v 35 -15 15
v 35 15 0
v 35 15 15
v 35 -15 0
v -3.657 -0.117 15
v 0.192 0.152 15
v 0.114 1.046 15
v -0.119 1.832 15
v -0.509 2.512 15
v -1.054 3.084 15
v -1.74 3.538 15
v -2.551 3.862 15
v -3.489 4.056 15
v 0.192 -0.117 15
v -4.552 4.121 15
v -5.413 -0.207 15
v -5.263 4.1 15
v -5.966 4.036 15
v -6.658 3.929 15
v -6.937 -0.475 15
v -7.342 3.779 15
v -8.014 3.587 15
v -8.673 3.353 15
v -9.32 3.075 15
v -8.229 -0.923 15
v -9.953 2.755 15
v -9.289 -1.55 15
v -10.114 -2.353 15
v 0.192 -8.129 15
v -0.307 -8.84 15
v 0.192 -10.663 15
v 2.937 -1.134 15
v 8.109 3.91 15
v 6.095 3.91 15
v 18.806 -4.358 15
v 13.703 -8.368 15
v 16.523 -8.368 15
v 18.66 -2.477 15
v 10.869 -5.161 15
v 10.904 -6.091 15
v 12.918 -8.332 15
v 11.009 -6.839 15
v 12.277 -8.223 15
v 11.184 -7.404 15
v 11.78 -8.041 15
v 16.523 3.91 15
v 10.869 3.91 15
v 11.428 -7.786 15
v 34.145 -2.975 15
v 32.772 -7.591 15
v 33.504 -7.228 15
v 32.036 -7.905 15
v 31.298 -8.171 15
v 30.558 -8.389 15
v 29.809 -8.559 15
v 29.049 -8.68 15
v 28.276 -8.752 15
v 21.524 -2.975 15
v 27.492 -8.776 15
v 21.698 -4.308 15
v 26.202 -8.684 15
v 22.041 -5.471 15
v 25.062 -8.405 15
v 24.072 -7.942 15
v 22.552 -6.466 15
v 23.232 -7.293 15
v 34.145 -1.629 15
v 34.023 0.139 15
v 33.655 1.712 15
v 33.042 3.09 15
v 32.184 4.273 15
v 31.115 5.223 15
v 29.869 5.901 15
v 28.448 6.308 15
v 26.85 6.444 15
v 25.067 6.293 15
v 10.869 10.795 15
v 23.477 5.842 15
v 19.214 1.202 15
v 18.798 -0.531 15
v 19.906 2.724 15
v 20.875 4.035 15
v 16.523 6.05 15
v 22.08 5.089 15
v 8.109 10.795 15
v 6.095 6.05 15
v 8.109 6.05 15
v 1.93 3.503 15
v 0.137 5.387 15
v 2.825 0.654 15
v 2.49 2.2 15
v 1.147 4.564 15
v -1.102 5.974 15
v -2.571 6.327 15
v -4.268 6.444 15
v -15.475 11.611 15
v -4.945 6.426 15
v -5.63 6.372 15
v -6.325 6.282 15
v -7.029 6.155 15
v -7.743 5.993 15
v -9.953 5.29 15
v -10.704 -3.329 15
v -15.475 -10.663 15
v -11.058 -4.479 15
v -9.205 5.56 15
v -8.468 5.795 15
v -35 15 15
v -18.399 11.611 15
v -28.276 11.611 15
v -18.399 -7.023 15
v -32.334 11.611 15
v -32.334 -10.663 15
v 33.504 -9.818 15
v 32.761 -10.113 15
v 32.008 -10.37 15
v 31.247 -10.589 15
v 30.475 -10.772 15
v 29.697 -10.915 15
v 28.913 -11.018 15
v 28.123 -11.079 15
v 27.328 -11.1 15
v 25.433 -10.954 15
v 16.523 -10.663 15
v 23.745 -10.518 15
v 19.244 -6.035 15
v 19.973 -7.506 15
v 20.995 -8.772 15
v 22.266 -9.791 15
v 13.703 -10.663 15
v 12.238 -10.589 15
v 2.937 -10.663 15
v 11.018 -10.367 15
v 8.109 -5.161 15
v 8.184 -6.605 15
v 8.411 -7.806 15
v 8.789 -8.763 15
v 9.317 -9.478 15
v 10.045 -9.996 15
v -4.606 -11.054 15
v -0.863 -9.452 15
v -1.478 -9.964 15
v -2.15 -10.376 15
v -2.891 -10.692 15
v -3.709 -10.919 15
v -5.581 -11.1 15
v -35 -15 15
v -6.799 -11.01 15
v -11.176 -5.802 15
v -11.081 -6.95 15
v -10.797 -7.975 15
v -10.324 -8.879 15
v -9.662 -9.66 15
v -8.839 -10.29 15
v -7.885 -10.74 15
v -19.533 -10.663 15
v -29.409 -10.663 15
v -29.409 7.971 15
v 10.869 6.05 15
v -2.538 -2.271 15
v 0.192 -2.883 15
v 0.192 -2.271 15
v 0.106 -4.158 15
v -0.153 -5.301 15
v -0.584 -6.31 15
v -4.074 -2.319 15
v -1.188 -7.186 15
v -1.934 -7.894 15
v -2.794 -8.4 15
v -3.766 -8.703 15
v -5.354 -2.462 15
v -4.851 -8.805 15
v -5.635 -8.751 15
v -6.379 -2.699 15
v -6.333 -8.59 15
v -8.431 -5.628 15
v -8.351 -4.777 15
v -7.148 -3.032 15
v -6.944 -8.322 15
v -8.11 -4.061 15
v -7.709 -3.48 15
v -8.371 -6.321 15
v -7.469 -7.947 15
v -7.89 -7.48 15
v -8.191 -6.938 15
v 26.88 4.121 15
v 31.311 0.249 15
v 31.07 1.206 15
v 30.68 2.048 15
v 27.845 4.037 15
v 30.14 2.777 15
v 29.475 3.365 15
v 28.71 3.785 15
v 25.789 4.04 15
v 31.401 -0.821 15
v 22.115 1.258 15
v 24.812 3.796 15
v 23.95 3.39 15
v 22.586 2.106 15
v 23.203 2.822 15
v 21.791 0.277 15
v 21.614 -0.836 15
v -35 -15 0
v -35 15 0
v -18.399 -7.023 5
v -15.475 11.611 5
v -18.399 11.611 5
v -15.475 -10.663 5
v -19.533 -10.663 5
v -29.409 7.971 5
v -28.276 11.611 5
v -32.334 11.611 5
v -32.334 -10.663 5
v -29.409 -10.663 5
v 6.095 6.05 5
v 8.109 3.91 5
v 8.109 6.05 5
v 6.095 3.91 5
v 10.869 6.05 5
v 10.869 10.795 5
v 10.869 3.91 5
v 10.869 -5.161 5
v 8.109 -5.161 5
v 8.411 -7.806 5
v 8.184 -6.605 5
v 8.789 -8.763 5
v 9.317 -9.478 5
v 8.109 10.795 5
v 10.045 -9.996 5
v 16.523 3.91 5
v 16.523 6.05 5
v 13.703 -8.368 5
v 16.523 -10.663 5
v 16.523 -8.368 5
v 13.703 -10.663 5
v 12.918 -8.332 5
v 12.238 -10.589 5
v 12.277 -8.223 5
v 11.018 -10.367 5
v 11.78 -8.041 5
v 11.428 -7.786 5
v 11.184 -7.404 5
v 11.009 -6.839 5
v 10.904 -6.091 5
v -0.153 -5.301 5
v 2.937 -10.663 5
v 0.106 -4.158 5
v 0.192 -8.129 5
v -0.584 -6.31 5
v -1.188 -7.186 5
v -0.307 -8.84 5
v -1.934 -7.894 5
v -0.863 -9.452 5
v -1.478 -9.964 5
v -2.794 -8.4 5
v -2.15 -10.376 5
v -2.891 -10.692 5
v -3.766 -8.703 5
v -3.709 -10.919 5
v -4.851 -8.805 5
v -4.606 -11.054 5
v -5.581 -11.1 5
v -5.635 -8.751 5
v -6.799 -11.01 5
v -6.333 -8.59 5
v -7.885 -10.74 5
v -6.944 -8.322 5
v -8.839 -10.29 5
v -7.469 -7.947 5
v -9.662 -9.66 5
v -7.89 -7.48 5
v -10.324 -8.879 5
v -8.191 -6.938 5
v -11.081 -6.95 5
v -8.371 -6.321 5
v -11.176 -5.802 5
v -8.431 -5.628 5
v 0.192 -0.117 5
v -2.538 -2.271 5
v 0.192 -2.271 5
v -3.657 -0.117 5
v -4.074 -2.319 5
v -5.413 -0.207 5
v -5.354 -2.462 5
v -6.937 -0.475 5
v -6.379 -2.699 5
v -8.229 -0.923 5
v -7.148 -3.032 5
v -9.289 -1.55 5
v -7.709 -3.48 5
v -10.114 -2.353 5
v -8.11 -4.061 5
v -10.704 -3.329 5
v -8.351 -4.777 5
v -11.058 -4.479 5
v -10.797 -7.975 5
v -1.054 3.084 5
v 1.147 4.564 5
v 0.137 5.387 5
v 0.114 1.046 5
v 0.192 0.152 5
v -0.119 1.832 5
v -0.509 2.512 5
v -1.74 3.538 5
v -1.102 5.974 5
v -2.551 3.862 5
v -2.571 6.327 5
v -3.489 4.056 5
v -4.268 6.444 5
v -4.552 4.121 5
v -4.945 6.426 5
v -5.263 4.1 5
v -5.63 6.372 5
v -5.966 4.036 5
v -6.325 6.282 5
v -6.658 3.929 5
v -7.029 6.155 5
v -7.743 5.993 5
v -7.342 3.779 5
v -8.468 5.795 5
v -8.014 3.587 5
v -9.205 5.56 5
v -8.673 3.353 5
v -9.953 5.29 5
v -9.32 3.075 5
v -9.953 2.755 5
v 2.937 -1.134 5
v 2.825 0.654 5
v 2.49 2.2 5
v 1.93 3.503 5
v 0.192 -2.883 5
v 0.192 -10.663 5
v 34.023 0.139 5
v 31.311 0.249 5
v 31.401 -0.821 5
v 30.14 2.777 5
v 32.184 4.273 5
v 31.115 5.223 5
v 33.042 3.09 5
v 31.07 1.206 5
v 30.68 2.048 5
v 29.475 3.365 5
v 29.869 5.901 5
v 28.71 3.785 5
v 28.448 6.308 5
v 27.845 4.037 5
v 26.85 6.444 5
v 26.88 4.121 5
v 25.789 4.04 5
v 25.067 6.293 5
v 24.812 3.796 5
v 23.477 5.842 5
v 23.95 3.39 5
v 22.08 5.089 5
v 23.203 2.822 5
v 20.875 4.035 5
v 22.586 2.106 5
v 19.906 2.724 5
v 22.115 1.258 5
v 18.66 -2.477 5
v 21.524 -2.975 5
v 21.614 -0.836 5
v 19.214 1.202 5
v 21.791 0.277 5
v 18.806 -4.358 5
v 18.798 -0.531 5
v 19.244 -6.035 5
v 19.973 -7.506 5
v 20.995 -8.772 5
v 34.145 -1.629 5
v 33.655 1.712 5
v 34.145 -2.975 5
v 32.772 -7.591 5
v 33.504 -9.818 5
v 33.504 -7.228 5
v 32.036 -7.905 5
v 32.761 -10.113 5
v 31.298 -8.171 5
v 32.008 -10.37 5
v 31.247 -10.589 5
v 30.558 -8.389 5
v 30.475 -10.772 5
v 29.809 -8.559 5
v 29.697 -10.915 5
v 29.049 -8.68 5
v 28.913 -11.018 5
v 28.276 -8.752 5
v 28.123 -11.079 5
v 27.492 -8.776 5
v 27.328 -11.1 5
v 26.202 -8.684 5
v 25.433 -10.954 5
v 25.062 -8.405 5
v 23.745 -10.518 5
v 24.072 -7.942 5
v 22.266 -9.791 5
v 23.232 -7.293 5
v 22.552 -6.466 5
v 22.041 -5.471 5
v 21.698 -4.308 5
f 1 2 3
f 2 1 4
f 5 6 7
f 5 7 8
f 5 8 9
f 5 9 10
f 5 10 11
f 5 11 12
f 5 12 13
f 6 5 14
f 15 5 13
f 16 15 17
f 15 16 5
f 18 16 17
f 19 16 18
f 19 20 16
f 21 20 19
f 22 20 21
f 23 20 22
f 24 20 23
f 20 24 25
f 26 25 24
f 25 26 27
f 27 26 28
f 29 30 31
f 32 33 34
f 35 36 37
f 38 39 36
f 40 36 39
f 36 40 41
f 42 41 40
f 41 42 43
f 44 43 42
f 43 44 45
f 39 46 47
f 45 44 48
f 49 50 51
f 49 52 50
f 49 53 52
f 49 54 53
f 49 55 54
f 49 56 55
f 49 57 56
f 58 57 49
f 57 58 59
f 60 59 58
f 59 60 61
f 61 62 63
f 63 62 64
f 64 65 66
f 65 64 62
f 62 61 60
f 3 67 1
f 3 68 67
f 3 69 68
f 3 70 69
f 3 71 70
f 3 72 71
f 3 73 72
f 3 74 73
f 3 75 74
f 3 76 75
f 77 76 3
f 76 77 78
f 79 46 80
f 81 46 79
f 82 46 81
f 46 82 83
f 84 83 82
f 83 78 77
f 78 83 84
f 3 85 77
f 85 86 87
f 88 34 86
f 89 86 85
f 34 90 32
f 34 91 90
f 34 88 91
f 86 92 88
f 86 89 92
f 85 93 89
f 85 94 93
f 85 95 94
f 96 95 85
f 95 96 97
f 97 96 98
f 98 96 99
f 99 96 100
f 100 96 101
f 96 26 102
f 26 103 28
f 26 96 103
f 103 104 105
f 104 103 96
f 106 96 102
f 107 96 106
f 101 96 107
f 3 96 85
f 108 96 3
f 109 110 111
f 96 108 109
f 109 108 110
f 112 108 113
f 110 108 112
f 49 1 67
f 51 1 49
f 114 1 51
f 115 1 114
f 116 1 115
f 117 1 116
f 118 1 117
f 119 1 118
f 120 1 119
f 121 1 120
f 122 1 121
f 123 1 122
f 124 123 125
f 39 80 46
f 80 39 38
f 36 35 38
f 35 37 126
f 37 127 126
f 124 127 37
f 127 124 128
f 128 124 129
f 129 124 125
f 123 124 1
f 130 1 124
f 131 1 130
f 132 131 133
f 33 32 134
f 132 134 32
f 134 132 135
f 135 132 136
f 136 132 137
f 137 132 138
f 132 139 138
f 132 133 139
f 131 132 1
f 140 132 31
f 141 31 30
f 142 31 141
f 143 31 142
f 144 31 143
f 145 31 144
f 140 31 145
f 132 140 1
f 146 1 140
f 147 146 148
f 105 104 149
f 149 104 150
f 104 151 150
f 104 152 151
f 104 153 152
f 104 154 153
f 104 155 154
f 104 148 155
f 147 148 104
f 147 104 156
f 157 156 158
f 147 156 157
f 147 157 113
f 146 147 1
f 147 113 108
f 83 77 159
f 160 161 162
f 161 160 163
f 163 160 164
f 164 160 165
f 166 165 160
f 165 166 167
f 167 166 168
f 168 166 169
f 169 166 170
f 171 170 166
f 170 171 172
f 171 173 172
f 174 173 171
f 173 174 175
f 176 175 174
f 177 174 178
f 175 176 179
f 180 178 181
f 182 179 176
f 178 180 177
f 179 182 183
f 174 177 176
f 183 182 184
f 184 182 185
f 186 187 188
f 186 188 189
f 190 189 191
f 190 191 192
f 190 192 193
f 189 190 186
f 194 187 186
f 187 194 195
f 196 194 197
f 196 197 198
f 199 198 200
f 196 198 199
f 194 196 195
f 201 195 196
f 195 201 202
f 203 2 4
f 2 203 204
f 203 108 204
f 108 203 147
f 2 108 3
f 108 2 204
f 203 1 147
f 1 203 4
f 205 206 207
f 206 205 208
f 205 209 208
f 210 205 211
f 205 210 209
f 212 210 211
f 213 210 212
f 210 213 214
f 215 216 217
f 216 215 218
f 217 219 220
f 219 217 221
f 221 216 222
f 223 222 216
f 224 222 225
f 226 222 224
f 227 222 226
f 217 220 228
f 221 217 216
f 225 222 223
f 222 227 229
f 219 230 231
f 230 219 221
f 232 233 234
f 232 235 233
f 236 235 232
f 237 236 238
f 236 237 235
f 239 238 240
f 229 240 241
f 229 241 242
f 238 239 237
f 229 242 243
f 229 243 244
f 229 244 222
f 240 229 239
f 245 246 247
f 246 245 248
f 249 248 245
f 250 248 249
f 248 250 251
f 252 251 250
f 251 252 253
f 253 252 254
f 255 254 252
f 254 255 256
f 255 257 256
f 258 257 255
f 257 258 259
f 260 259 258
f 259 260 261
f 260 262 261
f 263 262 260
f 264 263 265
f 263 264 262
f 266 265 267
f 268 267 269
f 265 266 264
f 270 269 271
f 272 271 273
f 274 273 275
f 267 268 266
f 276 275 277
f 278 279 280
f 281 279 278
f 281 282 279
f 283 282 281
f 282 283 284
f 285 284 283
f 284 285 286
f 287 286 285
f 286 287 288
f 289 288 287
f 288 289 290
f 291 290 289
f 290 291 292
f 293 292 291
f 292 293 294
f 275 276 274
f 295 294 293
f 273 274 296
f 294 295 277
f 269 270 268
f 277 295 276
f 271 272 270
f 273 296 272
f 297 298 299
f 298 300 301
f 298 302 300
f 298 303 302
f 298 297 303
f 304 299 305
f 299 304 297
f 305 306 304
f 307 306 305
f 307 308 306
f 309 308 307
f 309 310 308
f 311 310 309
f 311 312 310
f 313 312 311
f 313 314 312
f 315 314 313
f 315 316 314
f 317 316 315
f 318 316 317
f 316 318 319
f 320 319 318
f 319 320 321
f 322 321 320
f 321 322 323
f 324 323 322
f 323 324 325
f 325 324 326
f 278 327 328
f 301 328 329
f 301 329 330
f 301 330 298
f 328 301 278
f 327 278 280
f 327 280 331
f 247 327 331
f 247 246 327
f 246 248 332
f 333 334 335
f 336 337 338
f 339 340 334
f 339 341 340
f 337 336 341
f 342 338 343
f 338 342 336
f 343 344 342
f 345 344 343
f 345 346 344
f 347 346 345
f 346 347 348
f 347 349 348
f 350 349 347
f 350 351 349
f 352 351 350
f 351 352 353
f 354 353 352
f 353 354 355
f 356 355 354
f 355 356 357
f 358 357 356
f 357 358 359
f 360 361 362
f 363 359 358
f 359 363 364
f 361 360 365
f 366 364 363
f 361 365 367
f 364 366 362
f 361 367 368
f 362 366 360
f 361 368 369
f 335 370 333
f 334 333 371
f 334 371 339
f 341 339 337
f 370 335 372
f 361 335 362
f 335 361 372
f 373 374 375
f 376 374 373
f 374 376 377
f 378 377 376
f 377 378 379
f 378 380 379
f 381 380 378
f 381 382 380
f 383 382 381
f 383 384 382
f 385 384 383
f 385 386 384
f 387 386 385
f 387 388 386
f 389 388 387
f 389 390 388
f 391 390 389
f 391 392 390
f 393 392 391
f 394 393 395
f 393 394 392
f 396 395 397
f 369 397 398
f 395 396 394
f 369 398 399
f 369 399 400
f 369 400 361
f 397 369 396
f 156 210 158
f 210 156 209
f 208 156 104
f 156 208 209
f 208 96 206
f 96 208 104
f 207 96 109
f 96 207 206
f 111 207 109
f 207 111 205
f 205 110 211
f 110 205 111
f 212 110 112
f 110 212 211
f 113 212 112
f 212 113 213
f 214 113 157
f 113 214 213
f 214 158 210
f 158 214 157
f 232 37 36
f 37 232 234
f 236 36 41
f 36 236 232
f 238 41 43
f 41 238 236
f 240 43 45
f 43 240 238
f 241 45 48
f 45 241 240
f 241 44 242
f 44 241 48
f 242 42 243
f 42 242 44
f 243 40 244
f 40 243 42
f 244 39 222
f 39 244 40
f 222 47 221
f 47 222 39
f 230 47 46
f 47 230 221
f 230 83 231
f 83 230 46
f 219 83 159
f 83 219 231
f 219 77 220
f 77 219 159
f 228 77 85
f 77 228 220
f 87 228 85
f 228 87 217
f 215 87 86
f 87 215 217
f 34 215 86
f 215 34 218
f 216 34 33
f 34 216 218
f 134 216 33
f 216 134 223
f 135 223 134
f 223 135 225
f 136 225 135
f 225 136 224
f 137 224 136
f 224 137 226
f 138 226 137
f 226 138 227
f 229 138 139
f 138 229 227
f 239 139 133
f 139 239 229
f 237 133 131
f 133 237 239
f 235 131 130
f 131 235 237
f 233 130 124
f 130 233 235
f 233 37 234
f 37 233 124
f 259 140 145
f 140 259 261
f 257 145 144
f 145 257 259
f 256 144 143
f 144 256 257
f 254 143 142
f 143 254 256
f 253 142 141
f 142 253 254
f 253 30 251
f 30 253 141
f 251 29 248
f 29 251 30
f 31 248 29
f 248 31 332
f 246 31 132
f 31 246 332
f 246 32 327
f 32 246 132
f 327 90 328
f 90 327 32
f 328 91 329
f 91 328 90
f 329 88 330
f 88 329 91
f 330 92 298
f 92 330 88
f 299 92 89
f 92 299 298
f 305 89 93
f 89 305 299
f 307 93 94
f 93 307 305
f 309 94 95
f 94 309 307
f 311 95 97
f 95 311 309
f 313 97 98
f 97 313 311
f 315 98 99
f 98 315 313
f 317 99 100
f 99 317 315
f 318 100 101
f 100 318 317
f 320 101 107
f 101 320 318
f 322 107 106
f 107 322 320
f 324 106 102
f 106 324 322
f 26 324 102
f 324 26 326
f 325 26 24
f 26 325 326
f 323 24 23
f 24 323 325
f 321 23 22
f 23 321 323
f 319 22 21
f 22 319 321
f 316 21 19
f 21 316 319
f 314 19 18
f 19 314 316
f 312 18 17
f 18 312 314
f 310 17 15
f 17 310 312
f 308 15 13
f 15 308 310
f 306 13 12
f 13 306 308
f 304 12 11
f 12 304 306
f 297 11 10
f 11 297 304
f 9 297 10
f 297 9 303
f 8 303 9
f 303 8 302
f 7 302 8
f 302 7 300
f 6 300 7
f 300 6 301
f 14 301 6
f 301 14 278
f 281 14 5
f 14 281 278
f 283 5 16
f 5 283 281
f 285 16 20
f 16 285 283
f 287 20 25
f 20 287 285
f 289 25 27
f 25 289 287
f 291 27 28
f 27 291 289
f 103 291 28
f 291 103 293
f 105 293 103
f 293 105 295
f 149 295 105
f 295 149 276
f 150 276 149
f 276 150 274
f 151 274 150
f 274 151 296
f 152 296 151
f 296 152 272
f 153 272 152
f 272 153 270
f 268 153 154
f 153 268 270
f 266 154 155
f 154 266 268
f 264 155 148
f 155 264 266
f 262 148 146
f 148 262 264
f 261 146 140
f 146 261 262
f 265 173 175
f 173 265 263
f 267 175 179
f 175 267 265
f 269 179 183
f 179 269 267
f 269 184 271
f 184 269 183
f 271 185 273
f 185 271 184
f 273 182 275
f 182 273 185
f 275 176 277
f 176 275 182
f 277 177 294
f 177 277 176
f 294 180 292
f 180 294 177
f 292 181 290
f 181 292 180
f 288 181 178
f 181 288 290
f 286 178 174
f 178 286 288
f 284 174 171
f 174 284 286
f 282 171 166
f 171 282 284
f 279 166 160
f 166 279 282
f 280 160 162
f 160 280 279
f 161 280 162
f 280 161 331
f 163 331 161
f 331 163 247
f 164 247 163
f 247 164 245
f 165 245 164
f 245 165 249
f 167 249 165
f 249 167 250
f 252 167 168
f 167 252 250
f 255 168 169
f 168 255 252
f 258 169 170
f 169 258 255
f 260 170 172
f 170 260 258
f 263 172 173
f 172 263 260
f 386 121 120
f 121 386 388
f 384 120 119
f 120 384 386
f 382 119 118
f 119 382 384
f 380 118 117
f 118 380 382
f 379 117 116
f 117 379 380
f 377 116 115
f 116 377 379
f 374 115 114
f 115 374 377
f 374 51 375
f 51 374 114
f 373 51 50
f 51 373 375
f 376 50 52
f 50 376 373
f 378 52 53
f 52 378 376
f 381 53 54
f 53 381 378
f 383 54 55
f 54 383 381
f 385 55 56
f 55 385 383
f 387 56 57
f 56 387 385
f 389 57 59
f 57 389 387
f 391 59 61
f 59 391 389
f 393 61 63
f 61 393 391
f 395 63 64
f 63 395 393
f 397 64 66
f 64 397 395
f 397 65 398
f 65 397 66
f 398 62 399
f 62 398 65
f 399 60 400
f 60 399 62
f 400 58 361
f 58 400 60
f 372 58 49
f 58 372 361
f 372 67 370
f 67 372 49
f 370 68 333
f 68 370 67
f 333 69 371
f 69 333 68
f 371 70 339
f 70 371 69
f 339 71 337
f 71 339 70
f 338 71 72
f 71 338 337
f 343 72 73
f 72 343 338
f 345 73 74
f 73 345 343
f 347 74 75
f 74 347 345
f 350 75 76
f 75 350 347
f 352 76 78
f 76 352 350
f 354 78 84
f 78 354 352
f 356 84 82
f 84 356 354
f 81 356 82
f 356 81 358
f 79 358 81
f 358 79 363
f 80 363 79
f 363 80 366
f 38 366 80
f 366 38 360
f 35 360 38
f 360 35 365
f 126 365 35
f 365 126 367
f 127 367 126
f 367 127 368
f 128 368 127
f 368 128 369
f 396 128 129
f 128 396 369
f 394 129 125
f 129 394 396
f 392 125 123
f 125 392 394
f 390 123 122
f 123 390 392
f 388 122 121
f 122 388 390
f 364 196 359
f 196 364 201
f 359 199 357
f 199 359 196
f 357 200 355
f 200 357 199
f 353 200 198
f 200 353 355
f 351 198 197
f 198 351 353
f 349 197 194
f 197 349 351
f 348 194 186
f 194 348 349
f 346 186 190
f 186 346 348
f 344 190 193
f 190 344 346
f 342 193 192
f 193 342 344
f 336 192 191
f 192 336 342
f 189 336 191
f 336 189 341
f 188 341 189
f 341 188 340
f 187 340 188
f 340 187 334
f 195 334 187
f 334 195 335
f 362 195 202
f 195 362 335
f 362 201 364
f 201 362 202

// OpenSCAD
// LetterBlock.scad - Basic usage of text() and linear_extrude()

// Module instantiation
LetterBlock("Nate",30,70);

// Module definition.
// size=30 defines an optional parameter with a default value.
module LetterBlock(letter, height=30,width=0,depth=0) {
    width = width==0 ? height : width;
    depth = depth==0 ? height/2 : depth;
    size=height;
    difference() {
        translate([0,0,size/4]) cube([width,height,depth], center=true);
        translate([0,0,size/6]) {
            // convexity is needed for correct preview
            // since characters can be highly concave
            linear_extrude(height=size, convexity=4)
                text(letter, 
                     size=size*22/30,
                     font="Bitstream Vera Sans",
                     halign="center",
                     valign="center");
        }
    }
}

echo(version=version());
// Written by Marius Kintel <marius@kintel.net>
//
// To the extent possible under law, the author(s) have dedicated all
// copyright and related and neighboring rights to this software to the
// public domain worldwide. This software is distributed without any
// warranty.
//
// You should have received a copy of the CC0 Public Domain
// Dedication along with this software.
// If not, see <http://creativecommons.org/publicdomain/zero/1.0/>.
